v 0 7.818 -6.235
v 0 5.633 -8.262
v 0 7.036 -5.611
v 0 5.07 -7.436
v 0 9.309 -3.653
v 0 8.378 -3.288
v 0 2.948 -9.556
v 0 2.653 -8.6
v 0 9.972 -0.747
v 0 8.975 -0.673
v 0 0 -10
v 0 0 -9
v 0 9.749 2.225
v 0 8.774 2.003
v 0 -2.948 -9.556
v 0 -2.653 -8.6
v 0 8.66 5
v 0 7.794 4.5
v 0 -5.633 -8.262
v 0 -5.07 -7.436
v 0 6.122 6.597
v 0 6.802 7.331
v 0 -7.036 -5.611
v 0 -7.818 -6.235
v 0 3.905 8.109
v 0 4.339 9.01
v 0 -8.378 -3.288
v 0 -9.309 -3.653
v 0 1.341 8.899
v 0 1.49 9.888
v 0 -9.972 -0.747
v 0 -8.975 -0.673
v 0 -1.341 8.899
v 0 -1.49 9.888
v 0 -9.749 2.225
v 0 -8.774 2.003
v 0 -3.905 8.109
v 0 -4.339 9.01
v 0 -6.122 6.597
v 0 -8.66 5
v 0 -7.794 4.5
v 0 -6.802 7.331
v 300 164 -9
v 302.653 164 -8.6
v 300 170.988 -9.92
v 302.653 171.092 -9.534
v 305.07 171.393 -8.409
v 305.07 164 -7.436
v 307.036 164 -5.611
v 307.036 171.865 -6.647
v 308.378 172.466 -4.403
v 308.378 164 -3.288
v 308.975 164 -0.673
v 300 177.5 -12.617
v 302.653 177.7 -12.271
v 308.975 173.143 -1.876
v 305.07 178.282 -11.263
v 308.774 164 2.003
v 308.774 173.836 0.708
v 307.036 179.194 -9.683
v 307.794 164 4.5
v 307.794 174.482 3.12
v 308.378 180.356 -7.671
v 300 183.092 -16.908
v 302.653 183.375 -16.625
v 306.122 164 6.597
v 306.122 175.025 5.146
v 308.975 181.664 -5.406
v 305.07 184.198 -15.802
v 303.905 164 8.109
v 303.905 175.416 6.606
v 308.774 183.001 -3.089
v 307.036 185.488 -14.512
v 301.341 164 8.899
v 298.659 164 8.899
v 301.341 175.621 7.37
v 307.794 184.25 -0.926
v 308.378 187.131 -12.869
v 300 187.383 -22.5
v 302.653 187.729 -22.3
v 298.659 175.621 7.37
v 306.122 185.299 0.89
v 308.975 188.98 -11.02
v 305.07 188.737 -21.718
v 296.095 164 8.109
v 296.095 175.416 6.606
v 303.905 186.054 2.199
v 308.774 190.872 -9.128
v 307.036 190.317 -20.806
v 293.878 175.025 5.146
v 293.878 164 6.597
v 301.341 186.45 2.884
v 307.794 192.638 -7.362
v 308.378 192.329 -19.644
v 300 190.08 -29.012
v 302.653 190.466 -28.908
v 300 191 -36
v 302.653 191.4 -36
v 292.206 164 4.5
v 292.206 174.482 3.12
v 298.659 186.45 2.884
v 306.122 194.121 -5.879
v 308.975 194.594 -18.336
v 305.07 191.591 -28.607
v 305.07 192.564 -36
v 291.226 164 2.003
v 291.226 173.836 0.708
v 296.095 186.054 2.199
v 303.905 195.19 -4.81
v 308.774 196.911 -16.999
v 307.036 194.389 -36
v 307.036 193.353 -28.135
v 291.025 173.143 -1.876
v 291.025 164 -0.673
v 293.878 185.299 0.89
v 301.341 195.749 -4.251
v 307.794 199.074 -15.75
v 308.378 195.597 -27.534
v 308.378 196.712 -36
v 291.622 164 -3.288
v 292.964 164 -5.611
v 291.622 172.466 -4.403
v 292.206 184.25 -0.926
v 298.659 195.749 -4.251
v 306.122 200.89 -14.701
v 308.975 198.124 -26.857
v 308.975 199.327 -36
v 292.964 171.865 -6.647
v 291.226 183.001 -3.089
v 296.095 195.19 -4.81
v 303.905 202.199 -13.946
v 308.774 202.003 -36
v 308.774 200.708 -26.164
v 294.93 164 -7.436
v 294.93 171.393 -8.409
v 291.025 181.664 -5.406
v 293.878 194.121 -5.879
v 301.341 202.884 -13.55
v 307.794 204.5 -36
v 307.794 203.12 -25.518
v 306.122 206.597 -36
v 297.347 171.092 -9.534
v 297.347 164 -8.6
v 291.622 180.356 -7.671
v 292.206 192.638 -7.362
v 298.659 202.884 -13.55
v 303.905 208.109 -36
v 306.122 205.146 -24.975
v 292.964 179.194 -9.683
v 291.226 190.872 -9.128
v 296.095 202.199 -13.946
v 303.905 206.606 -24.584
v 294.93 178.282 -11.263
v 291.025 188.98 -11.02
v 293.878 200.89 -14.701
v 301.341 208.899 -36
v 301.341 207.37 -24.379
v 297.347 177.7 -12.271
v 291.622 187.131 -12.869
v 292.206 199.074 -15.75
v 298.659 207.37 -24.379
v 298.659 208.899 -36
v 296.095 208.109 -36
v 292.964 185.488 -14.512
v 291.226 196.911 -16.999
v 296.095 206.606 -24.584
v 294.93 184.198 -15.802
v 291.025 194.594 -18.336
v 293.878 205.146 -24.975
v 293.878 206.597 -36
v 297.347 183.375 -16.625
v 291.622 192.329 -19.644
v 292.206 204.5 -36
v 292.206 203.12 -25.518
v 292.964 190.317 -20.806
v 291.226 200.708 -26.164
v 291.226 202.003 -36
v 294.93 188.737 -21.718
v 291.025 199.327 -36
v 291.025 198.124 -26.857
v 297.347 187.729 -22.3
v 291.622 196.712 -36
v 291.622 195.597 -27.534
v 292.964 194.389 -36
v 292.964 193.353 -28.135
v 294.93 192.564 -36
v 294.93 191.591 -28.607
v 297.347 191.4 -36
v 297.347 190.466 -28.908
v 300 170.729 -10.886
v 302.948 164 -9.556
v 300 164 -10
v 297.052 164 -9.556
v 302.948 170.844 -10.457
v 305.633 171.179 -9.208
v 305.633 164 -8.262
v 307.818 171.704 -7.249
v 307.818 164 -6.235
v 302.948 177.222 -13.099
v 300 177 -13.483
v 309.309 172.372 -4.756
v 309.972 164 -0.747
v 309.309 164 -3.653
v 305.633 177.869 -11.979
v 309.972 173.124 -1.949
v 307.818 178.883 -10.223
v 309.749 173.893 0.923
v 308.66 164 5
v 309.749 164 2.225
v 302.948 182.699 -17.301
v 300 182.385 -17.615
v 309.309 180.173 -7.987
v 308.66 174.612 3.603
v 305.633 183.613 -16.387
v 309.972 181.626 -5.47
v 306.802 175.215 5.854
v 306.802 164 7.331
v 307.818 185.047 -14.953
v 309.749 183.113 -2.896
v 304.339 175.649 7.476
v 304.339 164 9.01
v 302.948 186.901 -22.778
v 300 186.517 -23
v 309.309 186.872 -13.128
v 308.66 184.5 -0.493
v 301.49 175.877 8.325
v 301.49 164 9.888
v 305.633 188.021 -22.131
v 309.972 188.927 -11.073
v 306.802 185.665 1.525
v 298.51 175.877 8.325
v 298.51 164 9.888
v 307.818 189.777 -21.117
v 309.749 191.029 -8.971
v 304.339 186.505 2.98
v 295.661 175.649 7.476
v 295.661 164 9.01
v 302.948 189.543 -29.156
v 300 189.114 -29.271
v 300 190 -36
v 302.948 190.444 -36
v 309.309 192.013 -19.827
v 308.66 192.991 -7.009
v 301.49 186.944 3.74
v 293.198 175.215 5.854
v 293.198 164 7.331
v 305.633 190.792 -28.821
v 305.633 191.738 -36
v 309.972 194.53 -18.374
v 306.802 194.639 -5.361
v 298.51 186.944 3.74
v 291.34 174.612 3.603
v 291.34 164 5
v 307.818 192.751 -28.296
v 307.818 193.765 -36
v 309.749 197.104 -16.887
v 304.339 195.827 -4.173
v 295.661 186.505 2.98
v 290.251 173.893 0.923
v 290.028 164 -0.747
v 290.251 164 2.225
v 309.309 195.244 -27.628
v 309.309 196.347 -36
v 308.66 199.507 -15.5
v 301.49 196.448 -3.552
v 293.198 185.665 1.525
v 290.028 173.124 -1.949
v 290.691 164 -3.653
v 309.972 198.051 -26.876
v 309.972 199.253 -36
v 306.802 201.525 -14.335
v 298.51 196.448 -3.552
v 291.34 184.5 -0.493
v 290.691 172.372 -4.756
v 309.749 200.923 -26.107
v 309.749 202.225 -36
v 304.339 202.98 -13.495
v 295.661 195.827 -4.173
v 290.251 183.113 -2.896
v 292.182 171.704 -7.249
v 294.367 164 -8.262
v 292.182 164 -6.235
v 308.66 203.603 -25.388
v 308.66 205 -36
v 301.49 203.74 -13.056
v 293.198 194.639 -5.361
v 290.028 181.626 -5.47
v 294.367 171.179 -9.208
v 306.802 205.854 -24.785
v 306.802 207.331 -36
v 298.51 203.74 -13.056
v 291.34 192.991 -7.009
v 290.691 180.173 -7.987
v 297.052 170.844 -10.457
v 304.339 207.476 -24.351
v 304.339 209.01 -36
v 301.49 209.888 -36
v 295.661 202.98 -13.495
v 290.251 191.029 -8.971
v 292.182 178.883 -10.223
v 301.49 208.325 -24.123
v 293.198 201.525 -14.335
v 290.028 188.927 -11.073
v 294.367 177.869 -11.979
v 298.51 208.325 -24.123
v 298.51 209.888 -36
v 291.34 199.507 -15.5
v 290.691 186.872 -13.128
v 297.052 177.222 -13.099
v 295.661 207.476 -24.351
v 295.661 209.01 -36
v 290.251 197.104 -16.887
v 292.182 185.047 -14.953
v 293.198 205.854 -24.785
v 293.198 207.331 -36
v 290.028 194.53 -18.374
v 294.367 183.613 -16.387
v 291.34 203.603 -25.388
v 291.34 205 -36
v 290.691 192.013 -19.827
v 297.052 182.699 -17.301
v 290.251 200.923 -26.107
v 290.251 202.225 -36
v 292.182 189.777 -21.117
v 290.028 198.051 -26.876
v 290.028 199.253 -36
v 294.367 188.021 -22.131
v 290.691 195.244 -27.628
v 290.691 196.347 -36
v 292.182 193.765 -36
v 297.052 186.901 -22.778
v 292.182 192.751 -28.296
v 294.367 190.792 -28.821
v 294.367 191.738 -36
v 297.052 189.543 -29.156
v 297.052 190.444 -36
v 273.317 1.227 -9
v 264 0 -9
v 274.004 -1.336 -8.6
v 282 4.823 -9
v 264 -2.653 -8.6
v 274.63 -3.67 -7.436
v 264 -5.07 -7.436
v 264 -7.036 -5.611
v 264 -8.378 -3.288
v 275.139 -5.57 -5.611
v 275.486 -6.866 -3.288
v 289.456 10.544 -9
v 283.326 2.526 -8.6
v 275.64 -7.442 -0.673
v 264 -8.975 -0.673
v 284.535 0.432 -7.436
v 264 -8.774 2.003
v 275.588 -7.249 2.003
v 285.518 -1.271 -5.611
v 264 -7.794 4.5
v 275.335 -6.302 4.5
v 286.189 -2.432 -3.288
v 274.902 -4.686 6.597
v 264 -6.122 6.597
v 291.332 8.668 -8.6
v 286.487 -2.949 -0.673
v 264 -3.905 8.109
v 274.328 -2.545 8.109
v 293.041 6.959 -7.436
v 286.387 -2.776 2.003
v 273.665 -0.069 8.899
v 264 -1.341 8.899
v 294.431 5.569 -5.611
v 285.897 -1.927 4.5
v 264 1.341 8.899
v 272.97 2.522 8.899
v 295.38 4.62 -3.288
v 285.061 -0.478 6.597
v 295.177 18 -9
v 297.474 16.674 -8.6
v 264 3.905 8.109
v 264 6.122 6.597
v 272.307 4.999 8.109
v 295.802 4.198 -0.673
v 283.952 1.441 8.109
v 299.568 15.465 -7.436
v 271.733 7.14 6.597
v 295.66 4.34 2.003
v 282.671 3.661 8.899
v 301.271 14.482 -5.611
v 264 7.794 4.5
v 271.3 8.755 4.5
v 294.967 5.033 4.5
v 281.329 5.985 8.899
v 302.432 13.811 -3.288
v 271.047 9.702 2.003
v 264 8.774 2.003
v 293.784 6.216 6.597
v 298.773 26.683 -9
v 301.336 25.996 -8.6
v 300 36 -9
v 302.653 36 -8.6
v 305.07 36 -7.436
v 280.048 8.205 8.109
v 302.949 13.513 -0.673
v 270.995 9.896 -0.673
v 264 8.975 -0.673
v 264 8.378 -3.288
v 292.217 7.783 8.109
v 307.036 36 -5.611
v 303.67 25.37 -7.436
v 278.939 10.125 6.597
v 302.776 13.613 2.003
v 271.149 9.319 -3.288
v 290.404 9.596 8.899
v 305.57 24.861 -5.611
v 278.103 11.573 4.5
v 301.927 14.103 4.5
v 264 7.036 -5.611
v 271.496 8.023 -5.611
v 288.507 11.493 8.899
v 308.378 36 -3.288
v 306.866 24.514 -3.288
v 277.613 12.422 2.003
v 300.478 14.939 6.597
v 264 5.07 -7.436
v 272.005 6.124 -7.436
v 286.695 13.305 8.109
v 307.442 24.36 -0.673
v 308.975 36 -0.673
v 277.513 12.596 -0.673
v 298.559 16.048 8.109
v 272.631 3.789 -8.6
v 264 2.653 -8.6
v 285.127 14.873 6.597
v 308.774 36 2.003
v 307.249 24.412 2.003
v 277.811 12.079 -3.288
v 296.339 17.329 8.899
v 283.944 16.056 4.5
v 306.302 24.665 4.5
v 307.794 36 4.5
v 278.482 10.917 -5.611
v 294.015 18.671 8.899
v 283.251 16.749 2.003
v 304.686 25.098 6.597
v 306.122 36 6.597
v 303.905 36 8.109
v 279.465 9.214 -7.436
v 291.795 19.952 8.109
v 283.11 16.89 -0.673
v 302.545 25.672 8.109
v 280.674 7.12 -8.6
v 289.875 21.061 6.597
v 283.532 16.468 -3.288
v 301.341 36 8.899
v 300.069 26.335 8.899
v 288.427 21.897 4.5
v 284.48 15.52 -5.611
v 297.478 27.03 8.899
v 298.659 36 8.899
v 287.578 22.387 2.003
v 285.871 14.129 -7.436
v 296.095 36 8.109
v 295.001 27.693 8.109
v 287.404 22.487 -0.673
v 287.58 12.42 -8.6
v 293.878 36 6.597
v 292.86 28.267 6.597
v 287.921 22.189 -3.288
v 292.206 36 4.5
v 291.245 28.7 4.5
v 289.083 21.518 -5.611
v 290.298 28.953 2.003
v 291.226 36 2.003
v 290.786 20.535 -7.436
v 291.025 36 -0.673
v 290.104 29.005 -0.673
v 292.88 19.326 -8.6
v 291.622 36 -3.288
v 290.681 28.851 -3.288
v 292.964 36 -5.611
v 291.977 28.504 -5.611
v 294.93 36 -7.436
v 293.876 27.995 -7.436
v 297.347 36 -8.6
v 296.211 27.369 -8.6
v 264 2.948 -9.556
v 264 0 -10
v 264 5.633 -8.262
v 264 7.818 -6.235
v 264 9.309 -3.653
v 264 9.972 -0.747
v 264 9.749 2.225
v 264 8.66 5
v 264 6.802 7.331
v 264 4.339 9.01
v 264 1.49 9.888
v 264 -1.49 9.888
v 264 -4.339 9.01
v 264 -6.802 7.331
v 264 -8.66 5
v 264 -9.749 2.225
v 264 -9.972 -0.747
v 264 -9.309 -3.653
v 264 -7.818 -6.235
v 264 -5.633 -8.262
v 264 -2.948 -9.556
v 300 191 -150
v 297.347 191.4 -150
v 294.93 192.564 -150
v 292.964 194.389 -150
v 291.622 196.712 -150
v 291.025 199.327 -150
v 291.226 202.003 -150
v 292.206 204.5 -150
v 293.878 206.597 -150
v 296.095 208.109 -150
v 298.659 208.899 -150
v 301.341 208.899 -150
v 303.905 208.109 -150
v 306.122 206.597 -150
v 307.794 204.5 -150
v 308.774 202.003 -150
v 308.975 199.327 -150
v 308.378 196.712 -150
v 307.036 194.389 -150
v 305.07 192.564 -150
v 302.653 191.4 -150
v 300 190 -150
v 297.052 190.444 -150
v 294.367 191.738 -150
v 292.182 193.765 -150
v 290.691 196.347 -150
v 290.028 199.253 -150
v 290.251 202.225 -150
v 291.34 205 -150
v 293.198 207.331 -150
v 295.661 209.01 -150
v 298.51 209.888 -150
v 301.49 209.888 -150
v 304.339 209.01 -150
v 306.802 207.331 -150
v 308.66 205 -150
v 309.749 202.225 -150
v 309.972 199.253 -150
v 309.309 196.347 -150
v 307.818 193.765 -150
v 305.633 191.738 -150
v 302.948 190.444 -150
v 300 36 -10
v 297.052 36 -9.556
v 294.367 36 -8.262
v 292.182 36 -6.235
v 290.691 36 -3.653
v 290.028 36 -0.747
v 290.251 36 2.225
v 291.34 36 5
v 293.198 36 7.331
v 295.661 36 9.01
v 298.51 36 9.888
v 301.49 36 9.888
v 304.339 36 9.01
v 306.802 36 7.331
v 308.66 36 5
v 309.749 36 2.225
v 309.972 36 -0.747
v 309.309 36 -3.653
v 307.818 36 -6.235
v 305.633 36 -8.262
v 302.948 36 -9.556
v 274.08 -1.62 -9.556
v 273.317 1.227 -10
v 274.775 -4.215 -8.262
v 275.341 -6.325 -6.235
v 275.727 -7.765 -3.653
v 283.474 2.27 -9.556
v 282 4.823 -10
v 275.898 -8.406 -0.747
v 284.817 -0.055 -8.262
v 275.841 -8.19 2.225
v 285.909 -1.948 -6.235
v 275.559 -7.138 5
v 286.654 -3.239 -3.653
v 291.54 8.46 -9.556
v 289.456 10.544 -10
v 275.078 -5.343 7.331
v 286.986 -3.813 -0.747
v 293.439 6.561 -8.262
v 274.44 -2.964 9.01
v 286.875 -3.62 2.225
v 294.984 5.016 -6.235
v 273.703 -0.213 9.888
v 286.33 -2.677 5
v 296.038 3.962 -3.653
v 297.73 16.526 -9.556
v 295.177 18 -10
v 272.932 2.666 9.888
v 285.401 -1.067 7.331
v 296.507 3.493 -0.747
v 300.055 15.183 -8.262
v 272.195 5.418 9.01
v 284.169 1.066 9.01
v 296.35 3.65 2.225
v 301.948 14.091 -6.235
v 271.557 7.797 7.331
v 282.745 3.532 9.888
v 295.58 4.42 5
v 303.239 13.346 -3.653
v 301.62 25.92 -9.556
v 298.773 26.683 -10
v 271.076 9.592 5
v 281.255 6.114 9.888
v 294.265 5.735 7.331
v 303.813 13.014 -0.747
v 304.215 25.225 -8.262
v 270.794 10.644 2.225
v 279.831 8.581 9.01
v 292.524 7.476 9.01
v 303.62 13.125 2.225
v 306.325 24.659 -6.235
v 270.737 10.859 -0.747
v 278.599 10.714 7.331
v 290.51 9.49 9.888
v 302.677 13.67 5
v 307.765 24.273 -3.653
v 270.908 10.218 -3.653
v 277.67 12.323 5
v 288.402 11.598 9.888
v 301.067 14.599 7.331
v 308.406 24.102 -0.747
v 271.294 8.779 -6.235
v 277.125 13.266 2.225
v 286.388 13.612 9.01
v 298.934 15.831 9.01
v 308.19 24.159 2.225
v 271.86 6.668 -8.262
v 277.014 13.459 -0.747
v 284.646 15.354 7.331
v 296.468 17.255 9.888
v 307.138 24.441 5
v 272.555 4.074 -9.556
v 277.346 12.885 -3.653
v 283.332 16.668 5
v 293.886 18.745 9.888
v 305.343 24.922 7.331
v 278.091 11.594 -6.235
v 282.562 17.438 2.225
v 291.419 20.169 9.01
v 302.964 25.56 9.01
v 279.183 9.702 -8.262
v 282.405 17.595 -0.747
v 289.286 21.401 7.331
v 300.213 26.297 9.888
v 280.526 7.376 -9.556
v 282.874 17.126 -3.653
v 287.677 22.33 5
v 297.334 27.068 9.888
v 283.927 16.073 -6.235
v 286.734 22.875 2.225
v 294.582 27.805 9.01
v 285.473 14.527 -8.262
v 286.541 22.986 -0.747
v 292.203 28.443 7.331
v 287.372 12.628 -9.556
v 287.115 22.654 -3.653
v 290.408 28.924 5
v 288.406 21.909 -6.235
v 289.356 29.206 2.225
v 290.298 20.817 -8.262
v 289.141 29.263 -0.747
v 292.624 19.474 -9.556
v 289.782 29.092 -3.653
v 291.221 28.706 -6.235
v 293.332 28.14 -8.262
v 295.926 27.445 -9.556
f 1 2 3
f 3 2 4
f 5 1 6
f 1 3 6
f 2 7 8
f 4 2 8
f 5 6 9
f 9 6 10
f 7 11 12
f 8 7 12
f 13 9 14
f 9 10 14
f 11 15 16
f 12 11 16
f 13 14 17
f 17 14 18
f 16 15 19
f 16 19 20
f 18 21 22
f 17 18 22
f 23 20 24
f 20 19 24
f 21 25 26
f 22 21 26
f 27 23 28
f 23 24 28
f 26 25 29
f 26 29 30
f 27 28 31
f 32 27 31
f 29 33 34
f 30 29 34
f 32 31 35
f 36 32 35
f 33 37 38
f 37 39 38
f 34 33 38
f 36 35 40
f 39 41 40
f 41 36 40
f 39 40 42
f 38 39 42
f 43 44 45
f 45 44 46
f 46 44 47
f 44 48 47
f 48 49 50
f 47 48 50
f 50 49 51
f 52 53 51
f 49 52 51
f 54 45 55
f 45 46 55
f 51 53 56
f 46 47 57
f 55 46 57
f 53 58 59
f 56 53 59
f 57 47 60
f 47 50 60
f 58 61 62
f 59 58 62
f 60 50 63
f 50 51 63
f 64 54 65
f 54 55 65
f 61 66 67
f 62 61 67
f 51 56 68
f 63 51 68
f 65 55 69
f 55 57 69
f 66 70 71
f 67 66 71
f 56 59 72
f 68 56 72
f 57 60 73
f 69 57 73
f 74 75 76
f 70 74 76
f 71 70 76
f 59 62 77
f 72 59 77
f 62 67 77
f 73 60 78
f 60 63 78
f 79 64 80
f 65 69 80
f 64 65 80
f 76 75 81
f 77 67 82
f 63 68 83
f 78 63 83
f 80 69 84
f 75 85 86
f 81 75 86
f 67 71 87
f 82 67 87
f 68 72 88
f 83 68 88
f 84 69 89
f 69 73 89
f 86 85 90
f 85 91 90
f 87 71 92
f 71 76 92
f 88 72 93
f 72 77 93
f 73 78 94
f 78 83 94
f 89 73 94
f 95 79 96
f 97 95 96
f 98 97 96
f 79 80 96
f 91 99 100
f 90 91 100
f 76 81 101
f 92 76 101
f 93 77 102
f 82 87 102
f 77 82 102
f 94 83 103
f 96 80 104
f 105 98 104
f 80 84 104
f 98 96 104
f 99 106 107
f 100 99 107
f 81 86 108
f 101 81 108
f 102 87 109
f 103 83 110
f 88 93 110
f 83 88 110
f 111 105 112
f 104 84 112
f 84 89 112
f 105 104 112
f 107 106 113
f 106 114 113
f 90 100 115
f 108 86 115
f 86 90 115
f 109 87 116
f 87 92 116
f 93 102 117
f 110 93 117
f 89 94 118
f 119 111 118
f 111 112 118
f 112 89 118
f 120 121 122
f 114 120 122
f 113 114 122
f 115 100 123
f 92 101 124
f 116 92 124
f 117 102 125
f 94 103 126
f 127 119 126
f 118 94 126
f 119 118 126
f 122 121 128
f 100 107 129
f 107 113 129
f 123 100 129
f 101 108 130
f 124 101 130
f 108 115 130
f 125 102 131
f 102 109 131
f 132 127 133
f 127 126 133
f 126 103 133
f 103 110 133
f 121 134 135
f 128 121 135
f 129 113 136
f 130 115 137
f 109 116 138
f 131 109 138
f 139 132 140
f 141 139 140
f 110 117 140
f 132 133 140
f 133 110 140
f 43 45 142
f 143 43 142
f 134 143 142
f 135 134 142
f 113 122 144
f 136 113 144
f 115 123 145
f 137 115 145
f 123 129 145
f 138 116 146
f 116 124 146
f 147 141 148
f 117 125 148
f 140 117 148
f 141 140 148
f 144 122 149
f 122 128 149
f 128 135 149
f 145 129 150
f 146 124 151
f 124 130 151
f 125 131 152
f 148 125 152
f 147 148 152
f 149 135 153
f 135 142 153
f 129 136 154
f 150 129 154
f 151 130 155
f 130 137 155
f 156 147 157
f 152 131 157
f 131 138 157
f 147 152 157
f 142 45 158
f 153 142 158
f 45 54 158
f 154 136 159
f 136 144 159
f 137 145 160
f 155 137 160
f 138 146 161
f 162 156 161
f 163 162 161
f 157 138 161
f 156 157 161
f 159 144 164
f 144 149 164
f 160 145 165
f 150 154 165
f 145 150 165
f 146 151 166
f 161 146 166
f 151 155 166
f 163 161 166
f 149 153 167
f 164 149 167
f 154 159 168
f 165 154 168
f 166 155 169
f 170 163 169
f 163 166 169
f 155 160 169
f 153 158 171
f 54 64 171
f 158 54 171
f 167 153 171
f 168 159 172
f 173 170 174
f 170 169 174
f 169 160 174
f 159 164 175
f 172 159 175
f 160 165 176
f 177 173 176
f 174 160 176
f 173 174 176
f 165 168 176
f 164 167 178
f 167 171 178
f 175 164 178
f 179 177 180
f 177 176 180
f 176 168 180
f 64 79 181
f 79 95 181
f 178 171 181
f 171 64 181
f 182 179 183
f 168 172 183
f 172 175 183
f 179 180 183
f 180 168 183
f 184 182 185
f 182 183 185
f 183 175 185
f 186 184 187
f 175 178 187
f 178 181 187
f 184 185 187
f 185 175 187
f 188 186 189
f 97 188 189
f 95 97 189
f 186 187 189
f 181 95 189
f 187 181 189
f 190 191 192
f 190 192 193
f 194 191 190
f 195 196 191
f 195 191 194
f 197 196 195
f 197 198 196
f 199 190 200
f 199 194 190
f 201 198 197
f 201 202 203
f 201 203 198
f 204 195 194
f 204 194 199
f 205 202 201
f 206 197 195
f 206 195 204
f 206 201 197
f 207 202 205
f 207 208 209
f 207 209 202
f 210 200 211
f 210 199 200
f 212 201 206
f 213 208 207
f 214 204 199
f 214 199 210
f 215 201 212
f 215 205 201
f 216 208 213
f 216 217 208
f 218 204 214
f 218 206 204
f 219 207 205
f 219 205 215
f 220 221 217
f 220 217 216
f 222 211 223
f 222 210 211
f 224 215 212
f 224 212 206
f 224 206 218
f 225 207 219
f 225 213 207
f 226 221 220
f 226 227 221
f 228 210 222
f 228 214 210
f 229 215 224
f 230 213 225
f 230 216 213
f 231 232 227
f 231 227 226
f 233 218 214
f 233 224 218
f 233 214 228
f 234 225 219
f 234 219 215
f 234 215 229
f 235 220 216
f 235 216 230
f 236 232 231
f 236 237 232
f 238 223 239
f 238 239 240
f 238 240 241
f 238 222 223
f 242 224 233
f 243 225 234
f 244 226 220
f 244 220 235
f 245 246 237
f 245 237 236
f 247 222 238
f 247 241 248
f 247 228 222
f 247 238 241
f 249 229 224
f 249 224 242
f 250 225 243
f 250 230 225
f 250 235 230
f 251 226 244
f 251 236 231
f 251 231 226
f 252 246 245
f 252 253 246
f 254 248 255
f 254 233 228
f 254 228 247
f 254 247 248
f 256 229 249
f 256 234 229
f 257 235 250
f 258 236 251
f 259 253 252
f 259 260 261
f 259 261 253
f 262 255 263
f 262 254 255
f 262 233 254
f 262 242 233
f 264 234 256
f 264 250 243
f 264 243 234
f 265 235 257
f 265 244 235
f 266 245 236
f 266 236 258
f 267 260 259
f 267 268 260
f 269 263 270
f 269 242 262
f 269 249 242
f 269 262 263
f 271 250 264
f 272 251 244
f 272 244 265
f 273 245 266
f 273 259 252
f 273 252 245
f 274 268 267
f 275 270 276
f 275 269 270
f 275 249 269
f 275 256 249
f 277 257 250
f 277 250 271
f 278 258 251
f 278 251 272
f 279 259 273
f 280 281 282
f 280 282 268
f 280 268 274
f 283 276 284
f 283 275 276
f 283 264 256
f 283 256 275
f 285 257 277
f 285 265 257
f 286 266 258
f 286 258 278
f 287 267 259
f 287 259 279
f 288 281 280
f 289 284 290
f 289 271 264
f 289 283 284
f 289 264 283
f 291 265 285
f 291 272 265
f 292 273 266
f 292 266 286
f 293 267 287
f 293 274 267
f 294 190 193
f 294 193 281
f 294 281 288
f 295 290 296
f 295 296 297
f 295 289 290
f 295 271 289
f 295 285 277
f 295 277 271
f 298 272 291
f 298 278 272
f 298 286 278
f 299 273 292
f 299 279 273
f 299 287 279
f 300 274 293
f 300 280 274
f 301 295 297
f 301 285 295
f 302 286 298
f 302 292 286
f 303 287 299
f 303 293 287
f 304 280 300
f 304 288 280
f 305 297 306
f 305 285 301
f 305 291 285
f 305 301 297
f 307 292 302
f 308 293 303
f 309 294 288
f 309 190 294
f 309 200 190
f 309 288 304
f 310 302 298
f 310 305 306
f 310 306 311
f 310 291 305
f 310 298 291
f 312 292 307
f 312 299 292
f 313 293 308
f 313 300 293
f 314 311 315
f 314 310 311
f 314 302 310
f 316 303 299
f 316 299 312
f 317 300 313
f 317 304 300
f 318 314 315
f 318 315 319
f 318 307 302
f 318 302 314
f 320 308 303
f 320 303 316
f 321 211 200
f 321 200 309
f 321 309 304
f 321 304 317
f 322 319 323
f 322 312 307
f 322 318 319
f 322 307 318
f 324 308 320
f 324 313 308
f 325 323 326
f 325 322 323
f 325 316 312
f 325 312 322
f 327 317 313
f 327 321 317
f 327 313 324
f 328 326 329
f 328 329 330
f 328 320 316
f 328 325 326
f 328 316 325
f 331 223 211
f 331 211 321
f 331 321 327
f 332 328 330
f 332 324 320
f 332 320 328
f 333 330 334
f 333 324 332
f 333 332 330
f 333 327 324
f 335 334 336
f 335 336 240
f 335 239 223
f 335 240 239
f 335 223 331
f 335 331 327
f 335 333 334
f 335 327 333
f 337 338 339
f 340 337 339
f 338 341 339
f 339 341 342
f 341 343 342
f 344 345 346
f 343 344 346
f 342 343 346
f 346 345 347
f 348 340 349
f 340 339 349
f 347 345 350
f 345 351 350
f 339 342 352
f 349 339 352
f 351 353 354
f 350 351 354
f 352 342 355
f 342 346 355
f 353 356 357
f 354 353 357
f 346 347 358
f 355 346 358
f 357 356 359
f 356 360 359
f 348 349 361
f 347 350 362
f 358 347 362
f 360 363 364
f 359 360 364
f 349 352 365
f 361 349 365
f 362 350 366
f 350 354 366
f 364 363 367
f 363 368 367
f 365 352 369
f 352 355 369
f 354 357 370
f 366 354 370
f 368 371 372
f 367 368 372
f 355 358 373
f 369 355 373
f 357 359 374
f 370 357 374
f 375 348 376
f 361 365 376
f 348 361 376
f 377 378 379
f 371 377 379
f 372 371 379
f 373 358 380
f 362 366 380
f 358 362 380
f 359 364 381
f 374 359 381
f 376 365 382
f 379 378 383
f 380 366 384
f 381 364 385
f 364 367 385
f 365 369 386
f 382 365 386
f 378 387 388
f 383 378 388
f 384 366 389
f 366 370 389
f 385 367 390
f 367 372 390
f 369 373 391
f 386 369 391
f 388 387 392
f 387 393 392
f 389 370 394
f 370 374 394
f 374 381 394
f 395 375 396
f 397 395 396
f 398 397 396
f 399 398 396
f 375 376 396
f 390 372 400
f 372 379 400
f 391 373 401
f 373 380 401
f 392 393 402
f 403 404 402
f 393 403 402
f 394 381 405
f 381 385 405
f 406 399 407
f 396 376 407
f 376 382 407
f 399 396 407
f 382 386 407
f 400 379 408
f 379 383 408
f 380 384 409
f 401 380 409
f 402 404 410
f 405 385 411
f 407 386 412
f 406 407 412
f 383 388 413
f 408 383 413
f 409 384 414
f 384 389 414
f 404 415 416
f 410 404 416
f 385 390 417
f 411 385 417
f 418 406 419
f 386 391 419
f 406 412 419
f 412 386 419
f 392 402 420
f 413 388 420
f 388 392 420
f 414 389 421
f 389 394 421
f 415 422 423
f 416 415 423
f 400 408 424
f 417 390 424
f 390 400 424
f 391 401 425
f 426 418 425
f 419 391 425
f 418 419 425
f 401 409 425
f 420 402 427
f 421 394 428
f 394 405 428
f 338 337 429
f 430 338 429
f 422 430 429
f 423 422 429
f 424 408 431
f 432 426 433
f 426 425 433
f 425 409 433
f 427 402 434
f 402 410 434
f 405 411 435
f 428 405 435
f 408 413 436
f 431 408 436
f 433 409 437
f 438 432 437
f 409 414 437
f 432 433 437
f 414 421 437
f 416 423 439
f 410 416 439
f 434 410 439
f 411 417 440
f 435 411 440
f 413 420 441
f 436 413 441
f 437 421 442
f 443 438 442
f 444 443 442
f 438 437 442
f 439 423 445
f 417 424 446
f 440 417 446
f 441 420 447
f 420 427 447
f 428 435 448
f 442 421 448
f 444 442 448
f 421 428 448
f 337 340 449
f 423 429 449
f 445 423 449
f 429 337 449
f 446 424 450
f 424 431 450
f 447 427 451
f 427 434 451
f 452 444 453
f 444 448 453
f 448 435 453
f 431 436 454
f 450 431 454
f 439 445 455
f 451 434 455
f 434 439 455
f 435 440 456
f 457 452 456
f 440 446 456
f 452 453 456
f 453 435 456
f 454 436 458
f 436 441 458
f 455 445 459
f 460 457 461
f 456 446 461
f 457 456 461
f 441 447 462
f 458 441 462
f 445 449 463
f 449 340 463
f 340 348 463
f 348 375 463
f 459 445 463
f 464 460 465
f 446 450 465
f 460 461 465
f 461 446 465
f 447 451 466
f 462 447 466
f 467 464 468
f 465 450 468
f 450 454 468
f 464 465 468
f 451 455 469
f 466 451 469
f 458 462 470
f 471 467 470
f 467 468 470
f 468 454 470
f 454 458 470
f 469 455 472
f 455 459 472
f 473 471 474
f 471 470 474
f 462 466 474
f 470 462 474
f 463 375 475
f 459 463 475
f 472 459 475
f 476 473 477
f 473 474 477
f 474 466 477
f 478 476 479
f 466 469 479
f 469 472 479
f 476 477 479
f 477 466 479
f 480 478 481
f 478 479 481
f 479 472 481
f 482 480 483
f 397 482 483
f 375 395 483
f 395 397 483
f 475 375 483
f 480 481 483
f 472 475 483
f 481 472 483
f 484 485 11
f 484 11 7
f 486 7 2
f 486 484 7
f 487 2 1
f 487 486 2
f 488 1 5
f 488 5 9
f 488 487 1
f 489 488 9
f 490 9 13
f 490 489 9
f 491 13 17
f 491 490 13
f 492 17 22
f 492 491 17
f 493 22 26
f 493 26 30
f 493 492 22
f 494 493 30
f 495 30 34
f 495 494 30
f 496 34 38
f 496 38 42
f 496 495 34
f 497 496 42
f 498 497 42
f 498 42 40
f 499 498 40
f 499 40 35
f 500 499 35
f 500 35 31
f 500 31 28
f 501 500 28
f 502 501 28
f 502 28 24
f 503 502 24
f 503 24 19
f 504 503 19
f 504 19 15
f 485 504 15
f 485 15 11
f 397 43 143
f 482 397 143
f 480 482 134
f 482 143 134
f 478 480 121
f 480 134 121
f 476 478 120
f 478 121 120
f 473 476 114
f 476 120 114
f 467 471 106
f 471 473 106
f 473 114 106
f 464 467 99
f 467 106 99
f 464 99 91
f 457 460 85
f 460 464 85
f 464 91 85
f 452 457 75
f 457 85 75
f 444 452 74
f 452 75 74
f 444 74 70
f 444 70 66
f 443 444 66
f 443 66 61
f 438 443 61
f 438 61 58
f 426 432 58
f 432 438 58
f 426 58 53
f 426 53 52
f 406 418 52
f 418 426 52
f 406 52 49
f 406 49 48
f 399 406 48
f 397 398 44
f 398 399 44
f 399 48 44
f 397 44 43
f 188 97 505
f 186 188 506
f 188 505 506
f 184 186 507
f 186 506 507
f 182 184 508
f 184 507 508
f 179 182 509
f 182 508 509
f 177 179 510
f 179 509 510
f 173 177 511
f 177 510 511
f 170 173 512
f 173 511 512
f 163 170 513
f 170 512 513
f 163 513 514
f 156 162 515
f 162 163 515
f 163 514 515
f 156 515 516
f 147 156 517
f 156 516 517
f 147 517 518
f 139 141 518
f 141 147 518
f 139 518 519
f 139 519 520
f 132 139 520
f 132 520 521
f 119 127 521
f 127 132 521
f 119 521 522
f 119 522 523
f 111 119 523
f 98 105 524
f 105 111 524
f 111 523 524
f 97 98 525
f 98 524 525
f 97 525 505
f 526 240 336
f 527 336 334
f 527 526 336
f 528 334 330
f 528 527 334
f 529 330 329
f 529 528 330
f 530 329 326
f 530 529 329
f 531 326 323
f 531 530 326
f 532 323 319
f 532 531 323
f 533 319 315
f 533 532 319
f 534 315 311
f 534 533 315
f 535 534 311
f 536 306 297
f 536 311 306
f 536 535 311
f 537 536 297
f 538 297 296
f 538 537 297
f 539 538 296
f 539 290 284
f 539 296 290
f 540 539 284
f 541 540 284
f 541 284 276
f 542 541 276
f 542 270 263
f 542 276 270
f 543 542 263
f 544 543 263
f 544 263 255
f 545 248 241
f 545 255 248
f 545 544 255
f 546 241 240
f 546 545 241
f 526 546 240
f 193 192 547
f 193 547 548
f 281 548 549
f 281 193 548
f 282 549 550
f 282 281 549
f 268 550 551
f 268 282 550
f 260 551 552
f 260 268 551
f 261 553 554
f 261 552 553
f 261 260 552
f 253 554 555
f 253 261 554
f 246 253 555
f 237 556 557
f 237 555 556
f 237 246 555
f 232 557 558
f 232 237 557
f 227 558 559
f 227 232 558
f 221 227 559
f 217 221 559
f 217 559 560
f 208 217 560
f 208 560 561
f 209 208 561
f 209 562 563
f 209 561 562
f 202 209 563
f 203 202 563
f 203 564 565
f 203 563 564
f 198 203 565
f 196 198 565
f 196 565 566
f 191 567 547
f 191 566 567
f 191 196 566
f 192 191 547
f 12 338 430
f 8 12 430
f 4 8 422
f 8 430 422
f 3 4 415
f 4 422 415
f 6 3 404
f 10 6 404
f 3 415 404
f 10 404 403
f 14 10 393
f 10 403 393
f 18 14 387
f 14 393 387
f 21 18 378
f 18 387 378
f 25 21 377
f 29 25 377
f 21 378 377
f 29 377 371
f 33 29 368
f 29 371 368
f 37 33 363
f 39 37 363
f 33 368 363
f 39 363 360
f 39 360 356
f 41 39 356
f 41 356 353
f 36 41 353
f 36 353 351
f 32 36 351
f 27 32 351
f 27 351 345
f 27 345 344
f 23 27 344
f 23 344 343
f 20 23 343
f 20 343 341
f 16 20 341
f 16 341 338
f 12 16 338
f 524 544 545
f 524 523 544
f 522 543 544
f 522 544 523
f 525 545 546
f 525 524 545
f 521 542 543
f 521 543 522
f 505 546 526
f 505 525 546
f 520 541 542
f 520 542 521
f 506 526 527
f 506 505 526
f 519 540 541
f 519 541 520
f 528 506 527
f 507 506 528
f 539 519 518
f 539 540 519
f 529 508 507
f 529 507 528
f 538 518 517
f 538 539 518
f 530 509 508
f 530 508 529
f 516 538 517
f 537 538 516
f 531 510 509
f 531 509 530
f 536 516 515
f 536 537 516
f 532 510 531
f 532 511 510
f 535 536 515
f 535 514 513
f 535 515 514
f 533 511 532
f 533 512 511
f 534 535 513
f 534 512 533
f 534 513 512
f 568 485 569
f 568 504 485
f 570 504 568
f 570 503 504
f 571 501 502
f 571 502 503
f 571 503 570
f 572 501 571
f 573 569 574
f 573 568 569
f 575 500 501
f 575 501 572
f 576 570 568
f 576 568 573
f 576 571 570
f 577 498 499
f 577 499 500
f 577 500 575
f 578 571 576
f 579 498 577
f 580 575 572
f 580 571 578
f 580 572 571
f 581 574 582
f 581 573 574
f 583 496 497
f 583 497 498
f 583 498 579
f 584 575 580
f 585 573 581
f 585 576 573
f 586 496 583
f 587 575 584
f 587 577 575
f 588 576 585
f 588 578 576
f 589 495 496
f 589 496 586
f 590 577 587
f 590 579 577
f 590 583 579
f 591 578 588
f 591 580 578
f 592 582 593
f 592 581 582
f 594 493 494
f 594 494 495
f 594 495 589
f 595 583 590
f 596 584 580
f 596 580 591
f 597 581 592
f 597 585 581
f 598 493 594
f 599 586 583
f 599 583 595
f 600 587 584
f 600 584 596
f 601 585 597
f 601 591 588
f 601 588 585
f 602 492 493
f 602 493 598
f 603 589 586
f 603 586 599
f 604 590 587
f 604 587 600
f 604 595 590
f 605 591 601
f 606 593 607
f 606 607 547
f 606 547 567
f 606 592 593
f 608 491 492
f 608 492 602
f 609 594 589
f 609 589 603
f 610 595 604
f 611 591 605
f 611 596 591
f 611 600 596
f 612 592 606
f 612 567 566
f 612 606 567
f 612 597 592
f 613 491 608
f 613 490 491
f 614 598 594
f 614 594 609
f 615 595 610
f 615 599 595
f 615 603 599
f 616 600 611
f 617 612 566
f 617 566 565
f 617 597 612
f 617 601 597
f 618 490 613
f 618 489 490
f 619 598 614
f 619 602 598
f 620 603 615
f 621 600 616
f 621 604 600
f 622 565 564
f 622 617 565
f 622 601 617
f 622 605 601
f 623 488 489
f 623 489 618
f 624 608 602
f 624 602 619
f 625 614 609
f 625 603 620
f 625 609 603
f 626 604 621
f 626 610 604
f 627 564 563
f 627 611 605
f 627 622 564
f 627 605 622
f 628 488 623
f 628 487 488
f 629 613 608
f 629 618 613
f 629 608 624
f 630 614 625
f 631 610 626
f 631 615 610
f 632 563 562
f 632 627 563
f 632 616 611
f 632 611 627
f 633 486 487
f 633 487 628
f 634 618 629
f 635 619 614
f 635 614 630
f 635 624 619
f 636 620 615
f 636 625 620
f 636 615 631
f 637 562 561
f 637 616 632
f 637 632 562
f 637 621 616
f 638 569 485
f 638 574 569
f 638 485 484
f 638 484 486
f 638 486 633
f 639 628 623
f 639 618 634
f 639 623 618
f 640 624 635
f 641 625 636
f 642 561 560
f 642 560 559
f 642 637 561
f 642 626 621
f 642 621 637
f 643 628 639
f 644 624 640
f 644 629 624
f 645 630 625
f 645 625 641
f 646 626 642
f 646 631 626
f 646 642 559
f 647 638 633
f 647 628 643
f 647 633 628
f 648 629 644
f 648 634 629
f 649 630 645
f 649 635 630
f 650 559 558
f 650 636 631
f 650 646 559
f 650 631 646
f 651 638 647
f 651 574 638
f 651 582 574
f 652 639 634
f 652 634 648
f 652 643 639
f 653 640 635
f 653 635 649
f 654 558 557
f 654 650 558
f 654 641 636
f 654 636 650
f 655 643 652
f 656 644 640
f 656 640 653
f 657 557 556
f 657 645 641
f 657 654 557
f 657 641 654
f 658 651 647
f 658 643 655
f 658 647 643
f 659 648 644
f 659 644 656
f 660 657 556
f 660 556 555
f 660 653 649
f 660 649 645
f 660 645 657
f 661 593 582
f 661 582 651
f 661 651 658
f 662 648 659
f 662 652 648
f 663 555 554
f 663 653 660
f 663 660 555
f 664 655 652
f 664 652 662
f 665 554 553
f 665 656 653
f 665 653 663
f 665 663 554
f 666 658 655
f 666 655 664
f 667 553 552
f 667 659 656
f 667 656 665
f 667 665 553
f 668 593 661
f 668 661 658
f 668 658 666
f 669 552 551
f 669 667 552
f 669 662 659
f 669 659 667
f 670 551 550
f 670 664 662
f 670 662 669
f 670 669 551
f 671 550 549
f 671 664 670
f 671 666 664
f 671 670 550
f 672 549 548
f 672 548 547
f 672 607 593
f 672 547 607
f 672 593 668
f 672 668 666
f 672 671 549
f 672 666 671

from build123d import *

# Parameters (mm, degrees)
SKIZZE1_R   = 10
SKIZZE1_R_2 = 9


with BuildPart() as part:
    # Austragung-Dünn1: sweep along a curve in space
    with BuildLine() as austragung_d_nn1_path:
        Line((0, 0, 0), (264, 0, 0))
        ThreePointArc((264, 0, 0), (289.455844123, 10.544155877, 0), (300, 36, 0))
        Line((300, 36, 0), (300, 164, 0))
        ThreePointArc((300, 164, 0), (300, 189.455844123, -10.544155877), (300, 200, -36))
        Line((300, 200, -36), (300, 200, -150))
    # Skizze1 → Austragung-Dünn1 (sweep)
    with BuildSketch(Plane(origin=(0, 0, 0), x_dir=(0, 0, -1), z_dir=(1, 0, 0))):
        Circle(SKIZZE1_R)
        Circle(SKIZZE1_R_2, mode=Mode.SUBTRACT)
    sweep(path=austragung_d_nn1_path.line)


solid = part.part
